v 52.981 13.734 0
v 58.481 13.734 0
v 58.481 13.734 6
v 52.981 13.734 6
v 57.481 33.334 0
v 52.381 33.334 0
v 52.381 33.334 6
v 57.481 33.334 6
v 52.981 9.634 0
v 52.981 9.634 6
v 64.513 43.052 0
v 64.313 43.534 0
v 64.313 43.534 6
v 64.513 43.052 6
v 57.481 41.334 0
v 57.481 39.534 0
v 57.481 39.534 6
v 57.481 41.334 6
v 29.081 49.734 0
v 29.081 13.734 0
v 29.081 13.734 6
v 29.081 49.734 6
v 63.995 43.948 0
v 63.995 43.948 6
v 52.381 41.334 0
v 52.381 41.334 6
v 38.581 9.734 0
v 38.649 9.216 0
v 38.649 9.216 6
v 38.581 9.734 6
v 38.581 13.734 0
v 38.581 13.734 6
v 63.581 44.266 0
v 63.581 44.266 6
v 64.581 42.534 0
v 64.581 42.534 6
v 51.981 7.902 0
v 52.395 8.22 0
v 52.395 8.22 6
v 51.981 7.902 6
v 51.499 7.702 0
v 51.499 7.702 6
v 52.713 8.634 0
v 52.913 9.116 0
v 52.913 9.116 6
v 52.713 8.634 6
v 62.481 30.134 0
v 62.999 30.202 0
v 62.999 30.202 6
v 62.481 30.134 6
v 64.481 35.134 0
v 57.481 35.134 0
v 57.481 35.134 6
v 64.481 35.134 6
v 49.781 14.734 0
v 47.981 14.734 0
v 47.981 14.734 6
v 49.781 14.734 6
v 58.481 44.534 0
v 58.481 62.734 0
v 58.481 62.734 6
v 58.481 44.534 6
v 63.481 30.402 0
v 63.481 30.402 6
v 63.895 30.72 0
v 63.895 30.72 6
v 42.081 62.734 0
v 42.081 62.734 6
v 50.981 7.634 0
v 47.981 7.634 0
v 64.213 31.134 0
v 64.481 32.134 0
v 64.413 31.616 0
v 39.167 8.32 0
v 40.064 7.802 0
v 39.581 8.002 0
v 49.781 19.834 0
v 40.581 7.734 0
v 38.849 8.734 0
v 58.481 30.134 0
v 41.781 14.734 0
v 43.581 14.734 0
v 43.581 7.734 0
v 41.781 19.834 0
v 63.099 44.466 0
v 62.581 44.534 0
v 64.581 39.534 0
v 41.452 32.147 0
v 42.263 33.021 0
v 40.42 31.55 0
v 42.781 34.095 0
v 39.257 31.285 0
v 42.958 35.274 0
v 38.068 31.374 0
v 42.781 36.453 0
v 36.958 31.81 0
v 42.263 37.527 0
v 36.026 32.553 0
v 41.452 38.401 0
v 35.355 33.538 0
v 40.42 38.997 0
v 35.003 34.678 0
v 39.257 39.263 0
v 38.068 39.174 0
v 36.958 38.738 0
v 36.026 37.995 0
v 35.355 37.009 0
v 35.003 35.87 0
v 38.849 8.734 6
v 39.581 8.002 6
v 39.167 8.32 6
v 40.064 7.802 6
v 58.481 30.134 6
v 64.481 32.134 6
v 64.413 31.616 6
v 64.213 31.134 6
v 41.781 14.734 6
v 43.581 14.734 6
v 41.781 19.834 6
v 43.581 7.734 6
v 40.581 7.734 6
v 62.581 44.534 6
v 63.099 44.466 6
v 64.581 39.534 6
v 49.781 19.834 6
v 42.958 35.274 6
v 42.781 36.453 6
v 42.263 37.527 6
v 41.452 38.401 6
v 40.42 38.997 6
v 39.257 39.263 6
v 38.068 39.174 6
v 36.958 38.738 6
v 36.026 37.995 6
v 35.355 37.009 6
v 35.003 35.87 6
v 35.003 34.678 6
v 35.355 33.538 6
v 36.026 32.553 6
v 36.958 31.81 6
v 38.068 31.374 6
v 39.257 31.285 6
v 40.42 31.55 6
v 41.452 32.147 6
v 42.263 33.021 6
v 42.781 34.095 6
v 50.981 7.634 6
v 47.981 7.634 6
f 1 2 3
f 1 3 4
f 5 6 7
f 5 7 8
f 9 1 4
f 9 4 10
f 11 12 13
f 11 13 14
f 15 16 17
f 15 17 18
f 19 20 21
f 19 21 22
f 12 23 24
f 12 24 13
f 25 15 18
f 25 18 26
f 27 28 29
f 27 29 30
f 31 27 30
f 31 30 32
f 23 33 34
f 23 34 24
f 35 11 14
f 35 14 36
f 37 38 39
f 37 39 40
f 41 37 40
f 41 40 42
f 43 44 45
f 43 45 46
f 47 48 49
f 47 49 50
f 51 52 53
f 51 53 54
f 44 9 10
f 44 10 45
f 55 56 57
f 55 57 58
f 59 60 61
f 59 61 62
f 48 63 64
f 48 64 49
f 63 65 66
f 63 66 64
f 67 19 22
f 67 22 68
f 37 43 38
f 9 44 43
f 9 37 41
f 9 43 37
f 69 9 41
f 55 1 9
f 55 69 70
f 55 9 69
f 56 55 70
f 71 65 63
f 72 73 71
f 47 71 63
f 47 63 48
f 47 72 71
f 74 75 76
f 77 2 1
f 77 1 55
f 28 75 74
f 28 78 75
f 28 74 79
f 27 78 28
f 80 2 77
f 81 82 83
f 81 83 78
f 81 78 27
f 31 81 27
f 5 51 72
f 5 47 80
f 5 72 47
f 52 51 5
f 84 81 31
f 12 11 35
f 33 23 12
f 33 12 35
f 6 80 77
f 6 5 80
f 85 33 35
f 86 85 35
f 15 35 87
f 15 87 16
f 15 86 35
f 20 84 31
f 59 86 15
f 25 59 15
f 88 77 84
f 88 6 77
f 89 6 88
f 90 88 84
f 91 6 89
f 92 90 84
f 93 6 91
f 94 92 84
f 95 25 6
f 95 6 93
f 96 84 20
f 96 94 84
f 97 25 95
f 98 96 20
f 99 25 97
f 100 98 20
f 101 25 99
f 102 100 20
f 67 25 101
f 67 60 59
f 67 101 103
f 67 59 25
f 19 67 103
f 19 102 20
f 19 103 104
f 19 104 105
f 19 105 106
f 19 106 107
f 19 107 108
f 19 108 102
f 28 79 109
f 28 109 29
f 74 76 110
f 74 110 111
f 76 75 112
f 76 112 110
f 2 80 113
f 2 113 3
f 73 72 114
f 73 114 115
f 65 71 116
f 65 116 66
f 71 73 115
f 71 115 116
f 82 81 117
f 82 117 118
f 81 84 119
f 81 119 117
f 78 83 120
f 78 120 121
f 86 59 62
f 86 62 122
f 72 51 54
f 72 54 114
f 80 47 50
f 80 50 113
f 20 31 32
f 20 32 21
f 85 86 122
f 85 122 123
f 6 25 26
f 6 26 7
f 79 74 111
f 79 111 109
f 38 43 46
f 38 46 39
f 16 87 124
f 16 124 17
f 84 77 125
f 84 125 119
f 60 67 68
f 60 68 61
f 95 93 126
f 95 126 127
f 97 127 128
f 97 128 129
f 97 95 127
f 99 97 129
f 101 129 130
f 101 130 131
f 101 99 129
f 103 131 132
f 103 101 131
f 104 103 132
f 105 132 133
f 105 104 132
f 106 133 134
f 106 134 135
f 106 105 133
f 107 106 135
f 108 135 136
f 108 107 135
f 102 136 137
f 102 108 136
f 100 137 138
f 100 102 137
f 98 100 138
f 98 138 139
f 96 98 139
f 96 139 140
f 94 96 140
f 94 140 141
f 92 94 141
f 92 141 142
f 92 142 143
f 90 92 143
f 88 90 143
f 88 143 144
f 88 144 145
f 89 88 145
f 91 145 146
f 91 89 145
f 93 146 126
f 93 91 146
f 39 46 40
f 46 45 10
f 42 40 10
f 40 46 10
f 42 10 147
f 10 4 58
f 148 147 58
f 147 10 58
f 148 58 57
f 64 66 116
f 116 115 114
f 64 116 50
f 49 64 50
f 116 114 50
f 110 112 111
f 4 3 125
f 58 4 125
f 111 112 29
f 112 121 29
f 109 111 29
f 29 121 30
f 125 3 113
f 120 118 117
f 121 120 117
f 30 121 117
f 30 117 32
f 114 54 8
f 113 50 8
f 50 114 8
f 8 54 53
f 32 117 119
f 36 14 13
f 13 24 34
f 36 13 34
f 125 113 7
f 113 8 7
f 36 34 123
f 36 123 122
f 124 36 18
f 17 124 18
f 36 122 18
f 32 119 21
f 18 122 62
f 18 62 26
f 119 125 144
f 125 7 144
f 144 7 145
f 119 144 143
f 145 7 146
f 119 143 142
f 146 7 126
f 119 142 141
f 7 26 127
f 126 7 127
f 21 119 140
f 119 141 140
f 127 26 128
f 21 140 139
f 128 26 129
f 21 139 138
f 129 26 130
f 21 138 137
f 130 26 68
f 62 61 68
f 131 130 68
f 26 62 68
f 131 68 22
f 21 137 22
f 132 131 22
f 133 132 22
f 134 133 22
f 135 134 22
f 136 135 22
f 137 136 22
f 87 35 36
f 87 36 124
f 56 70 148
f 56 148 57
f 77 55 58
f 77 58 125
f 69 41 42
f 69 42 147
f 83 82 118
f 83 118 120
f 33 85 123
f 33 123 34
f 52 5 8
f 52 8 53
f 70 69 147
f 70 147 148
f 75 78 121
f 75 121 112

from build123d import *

# Parameters (mm, degrees)
MODEL_R                  = 4
RESSALTO_EXTRUS_O1_DEPTH = 6


with BuildPart() as part:
    # Model → Ressalto-extrusão1 (new body)
    with BuildSketch(Plane.XY):
        Polygon((52.38116631, 33.333915264), (57.481164074, 33.333915264), (57.481164074, 35.133913496), (64.481162154, 35.133913496), (64.481162154, 32.133915096), (64.413013807, 31.616277005), (64.213212962, 31.133915096), (63.895375717, 30.719701533), (63.481162154, 30.401864288), (62.998800244, 30.202063443), (62.481162154, 30.133915096), (58.481164074, 30.133915096), (58.481164074, 13.733926647), (52.981162794, 13.733926647), (52.981162794, 9.633928599), (52.913014447, 9.116290509), (52.713213602, 8.633928599), (52.395376357, 8.219715037), (51.981162794, 7.901877792), (51.498800885, 7.702076947), (50.981162794, 7.633928599), (47.981164394, 7.633928599), (47.981164394, 14.733926647), (49.781168706, 14.733926647), (49.781168706, 19.833924412), (41.781167571, 19.833924412), (41.781167571, 14.733926647), (43.581165802, 14.733926647), (43.581165802, 7.733928567), (40.581167402, 7.733928567), (40.063529312, 7.802076915), (39.581167402, 8.00187776), (39.16695384, 8.319715005), (38.849116595, 8.733928567), (38.64931575, 9.216290477), (38.581167402, 9.733928567), (38.581167402, 13.733926647), (29.081172202, 13.733926647), (29.081172202, 49.733913847), (42.081169322, 62.733910967), (58.481164074, 62.733910967), (58.481164074, 44.533910488), (62.581162122, 44.533910488), (63.098800212, 44.46576214), (63.581162122, 44.265961295), (63.995375685, 43.94812405), (64.31321293, 43.533910488), (64.513013775, 43.051548578), (64.581162122, 42.533910488), (64.581162122, 39.533912088), (57.481164074, 39.533912088), (57.481164074, 41.333916399), (52.38116631, 41.333916399), align=None)
        with Locations((38.95844444, 35.273938656)):
            Circle(MODEL_R, mode=Mode.SUBTRACT)
    extrude(amount=RESSALTO_EXTRUS_O1_DEPTH)


solid = part.part
